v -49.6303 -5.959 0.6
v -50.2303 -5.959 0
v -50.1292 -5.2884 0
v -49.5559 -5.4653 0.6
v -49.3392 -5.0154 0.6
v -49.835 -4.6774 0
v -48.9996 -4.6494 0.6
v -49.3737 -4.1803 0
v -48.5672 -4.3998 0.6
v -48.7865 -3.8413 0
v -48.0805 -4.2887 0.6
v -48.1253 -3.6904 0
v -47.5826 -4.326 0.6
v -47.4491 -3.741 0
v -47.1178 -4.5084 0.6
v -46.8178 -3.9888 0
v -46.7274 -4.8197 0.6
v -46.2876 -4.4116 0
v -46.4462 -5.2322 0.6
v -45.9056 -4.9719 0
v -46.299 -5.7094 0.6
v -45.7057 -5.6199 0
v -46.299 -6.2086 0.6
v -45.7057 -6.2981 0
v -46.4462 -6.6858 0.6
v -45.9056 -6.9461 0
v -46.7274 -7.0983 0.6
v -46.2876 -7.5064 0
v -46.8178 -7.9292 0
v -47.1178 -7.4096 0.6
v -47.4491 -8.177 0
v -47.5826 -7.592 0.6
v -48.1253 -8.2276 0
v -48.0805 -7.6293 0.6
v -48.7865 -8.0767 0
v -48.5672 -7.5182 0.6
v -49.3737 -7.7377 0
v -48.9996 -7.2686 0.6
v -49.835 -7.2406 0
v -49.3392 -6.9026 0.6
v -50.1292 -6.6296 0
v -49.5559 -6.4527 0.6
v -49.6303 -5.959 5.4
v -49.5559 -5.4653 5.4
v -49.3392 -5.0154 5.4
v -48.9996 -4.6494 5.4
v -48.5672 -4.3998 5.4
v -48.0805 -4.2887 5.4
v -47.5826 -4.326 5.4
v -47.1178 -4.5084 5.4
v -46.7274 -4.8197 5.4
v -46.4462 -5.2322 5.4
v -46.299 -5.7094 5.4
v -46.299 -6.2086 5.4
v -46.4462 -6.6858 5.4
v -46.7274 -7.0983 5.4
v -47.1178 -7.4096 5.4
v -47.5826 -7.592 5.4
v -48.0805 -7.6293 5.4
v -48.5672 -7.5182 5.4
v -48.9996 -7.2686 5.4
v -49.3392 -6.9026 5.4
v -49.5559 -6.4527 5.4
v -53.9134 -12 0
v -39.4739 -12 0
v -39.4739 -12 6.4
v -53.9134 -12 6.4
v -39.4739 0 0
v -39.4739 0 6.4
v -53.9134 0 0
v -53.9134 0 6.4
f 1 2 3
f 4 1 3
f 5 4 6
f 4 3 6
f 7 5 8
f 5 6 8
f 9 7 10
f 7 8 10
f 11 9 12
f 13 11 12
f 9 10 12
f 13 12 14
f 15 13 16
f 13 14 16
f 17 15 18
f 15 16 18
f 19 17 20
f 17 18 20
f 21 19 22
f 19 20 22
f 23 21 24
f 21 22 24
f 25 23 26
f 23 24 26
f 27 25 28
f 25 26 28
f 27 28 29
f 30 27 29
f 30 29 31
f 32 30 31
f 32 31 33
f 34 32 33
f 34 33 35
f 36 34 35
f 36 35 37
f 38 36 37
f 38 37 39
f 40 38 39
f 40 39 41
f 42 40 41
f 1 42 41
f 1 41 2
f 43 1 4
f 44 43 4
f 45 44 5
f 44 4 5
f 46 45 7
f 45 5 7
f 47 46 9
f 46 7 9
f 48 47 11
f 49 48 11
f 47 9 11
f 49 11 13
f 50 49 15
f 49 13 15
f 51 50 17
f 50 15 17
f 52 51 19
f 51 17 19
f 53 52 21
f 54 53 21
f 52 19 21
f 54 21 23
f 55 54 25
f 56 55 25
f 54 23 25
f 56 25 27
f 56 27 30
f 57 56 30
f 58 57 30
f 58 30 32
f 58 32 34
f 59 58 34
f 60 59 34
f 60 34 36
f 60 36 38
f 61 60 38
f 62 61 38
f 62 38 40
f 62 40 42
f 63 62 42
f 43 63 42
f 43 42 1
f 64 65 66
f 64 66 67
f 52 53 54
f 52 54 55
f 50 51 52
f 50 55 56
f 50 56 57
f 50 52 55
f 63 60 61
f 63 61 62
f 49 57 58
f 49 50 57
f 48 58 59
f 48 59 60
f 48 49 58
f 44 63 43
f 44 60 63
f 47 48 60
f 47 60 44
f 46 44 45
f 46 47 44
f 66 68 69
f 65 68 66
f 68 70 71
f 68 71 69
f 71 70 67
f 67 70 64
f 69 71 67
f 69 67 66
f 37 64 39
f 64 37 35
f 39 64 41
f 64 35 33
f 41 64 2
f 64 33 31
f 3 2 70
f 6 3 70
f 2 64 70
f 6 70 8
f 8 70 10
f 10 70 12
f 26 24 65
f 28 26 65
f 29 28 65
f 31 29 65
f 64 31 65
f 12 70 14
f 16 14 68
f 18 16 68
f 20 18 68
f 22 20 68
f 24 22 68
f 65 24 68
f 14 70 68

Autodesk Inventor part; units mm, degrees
ref_plane "YZ Plane" through (0, 0, 0) normal (1, 0, 0) x (0, 1, 0)
ref_plane "XZ Plane" through (0, 0, 0) normal (0, 1, 0) x (-1, 0, 0)
ref_plane "XY Plane" through (0, 0, 0) normal (0, 0, 1) x (1, 0, 0)
sketch "Skizze1" plane through (0, 0, 0) normal (0, 0, 1) x (1, 0, 0)
  line L0 (-41.9152, 0) -> (-41.9152, -12) projected
  line L1 (-53.9134, -12) -> (-41.9152, -12) projected
  line L2 (-53.9134, 0) -> (-53.9134, -12) projected
  line L3 (-41.9152, 0) -> (-53.9134, 0) projected
  line L4 (-39.4739, 0) -> (-39.4739, -12) projected
  line L5 (-41.9558, -12.0406) -> (-53.9549, -0.0415) construction
  line L6 (-53.9549, -11.9585) -> (-41.9558, 0.0406) construction
  circle A0 centre (-47.9553, -5.959) radius 1.675
  line L7 (-39.4739, -12) -> (-53.9134, -12)
  line L8 (-53.9134, -12) -> (-53.9134, 0)
  line L9 (-53.9134, 0) -> (-39.4739, 0)
  line L10 (-39.4739, 0) -> (-39.4739, -12)
  point P0 (0, 0)
  point P1 (-39.4739, 0)
  dimension "d0" = 3.35
extrude "Extrusion1" add sketch "Skizze1" along normal blind 6.4 contours L9 L4 L7 L0 | L0 L1 L2 L3 | A0
sketch "Skizze2" plane through (0, 0, 0) normal (0, 0, -1) x (-1, 0, 0)
  circle A0 centre (47.9553, -5.959) radius 1.675 projected
  point P0 (0, 0)
extrude "Extrusion2" cut sketch "Skizze2" against normal blind 5.4
chamfer "Fase1" distance 0.6 angle 45 1 edges at (-46.2803, -5.959, 0)
properties part number "13_Motor_Fixation_Thread_Mount"
